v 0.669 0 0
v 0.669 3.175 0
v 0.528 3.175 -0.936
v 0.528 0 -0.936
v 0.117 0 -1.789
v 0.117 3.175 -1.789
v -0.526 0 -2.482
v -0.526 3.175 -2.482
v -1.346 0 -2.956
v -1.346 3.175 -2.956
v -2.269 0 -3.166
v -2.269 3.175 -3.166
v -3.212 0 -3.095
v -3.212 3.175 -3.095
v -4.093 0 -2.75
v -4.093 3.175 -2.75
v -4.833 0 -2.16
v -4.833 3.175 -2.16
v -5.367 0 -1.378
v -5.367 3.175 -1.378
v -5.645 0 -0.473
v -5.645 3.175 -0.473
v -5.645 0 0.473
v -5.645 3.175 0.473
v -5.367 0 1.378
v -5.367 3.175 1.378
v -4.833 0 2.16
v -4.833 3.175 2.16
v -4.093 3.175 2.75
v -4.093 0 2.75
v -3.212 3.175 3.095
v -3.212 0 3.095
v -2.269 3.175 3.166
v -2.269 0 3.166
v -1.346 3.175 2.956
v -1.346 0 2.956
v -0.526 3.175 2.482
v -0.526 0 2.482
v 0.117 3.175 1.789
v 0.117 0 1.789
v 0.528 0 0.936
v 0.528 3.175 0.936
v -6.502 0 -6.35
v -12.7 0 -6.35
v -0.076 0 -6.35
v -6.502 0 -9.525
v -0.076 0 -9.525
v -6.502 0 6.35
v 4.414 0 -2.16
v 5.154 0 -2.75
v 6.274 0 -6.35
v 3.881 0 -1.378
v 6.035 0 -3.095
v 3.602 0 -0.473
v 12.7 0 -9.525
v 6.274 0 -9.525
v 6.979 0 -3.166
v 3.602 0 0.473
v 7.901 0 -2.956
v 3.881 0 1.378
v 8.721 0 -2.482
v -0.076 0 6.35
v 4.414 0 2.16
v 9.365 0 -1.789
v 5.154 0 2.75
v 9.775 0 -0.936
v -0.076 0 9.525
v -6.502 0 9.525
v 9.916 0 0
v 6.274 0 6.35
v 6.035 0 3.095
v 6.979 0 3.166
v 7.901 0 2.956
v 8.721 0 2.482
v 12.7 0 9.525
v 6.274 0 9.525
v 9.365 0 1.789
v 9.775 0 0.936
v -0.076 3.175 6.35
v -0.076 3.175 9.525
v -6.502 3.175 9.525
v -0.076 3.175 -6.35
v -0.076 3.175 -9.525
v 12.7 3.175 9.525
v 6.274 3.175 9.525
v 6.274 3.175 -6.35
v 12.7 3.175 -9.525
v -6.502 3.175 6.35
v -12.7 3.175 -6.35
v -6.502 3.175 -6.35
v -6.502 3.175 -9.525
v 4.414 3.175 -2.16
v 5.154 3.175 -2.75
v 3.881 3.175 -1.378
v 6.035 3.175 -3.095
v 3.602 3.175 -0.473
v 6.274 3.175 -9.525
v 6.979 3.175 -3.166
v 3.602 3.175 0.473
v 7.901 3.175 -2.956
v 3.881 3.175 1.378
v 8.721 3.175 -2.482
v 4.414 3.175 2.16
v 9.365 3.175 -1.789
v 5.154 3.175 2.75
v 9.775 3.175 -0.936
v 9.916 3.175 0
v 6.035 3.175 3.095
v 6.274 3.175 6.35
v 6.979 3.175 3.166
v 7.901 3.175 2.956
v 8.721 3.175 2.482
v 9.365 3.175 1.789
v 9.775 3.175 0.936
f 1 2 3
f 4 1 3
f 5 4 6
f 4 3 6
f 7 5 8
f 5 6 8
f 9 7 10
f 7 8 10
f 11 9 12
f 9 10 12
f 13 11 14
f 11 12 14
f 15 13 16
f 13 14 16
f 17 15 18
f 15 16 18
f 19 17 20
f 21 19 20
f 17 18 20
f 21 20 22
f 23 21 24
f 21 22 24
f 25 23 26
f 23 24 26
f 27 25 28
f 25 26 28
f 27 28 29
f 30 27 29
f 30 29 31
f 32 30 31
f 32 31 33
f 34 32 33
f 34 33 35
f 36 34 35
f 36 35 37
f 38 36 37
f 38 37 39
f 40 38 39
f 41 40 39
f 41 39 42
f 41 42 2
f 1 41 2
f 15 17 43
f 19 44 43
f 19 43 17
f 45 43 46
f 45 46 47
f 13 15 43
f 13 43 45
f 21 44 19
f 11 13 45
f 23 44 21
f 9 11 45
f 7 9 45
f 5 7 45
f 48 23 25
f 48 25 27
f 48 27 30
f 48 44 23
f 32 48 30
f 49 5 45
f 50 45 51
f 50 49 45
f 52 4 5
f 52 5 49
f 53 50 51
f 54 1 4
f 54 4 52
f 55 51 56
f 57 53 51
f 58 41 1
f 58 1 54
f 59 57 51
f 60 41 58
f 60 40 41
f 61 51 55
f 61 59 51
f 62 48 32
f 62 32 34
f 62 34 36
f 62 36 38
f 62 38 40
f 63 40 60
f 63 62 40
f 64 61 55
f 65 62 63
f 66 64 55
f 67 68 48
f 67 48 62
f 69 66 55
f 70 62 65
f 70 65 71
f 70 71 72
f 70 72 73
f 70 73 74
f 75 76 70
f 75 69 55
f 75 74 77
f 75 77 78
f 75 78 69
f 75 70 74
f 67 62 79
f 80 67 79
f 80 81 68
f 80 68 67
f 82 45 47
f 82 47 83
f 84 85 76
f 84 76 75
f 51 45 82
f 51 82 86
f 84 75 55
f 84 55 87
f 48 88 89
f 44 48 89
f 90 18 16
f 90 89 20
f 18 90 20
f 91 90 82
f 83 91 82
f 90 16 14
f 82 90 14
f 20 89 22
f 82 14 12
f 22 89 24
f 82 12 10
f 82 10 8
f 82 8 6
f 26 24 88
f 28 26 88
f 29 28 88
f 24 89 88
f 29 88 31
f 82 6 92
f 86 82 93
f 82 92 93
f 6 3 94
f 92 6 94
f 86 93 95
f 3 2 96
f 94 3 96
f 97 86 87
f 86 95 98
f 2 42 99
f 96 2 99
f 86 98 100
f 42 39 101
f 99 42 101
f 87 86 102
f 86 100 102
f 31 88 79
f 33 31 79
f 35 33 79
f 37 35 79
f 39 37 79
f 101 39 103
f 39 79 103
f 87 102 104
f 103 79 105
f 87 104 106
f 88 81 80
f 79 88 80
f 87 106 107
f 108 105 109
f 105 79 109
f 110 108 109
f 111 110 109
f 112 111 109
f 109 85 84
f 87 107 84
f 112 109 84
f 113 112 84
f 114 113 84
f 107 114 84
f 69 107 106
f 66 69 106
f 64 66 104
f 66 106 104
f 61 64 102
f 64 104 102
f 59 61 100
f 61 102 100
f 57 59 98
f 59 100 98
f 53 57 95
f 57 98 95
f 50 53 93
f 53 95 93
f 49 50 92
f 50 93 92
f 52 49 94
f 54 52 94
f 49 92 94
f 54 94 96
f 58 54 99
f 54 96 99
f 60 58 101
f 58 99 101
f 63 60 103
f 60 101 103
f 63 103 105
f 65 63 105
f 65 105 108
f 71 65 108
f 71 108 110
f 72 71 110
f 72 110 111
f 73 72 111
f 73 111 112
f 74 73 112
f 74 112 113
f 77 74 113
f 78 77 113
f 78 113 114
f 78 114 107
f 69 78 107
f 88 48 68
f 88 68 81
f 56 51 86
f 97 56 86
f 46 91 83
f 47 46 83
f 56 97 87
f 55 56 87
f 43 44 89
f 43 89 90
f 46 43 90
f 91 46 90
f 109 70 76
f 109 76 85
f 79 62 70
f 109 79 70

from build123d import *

# Parameters (mm, degrees)
SKETCH1_W           = 25.4
SKETCH1_H           = 12.7
BOSS_EXTRUDE1_DEPTH = 3.175
SKETCH2_W           = 6.4262
SKETCH2_H           = 3.175
BOSS_EXTRUDE2_DEPTH = 3.175
CUT_EXTRUDE1_DEPTH  = 3.175
SKETCH4_R           = 3.175
CUT_EXTRUDE2_DEPTH  = 4.175


with BuildPart() as part:
    # Sketch1 → Boss-Extrude1 (new body)
    with BuildSketch(Plane(origin=(0, 0, 0), x_dir=(1, 0, 0), z_dir=(0, 1, 0))):
        Rectangle(SKETCH1_W, SKETCH1_H)
    extrude(amount=BOSS_EXTRUDE1_DEPTH)

    # Sketch2 → Boss-Extrude2 (add)
    with BuildSketch(Plane.XY.offset(6.35)):
        with Locations((9.4869, 1.5875)):
            Rectangle(SKETCH2_W, SKETCH2_H)
        with Locations((-3.2893, 1.5875)):
            Rectangle(SKETCH2_W, SKETCH2_H)
    boss_extrude2 = extrude(amount=BOSS_EXTRUDE2_DEPTH)

    # Mirror1: Boss-Extrude2 across plane
    add(boss_extrude2.mirror(Plane.XY))

    # Sketch3 → Cut-Extrude1 (cut)
    with BuildSketch(Plane(origin=(0, 3.175, 0), x_dir=(1, 0, 0), z_dir=(0, 1, 0))):
        Polygon((-6.5024, -6.35), (-12.7, 6.35), (-12.7, -6.35), align=None)
    extrude(amount=-CUT_EXTRUDE1_DEPTH, mode=Mode.SUBTRACT)

    # Sketch4 → Cut-Extrude2 (cut, through all)
    with BuildSketch(Plane(origin=(0, 3.175, 0), x_dir=(1, 0, 0), z_dir=(0, 1, 0))):
        with Locations((-2.505931508, 0)):
            Circle(SKETCH4_R)
        with Locations((6.741308704, 0)):
            Circle(SKETCH4_R)
    extrude(amount=-CUT_EXTRUDE2_DEPTH, mode=Mode.SUBTRACT)


solid = part.part
